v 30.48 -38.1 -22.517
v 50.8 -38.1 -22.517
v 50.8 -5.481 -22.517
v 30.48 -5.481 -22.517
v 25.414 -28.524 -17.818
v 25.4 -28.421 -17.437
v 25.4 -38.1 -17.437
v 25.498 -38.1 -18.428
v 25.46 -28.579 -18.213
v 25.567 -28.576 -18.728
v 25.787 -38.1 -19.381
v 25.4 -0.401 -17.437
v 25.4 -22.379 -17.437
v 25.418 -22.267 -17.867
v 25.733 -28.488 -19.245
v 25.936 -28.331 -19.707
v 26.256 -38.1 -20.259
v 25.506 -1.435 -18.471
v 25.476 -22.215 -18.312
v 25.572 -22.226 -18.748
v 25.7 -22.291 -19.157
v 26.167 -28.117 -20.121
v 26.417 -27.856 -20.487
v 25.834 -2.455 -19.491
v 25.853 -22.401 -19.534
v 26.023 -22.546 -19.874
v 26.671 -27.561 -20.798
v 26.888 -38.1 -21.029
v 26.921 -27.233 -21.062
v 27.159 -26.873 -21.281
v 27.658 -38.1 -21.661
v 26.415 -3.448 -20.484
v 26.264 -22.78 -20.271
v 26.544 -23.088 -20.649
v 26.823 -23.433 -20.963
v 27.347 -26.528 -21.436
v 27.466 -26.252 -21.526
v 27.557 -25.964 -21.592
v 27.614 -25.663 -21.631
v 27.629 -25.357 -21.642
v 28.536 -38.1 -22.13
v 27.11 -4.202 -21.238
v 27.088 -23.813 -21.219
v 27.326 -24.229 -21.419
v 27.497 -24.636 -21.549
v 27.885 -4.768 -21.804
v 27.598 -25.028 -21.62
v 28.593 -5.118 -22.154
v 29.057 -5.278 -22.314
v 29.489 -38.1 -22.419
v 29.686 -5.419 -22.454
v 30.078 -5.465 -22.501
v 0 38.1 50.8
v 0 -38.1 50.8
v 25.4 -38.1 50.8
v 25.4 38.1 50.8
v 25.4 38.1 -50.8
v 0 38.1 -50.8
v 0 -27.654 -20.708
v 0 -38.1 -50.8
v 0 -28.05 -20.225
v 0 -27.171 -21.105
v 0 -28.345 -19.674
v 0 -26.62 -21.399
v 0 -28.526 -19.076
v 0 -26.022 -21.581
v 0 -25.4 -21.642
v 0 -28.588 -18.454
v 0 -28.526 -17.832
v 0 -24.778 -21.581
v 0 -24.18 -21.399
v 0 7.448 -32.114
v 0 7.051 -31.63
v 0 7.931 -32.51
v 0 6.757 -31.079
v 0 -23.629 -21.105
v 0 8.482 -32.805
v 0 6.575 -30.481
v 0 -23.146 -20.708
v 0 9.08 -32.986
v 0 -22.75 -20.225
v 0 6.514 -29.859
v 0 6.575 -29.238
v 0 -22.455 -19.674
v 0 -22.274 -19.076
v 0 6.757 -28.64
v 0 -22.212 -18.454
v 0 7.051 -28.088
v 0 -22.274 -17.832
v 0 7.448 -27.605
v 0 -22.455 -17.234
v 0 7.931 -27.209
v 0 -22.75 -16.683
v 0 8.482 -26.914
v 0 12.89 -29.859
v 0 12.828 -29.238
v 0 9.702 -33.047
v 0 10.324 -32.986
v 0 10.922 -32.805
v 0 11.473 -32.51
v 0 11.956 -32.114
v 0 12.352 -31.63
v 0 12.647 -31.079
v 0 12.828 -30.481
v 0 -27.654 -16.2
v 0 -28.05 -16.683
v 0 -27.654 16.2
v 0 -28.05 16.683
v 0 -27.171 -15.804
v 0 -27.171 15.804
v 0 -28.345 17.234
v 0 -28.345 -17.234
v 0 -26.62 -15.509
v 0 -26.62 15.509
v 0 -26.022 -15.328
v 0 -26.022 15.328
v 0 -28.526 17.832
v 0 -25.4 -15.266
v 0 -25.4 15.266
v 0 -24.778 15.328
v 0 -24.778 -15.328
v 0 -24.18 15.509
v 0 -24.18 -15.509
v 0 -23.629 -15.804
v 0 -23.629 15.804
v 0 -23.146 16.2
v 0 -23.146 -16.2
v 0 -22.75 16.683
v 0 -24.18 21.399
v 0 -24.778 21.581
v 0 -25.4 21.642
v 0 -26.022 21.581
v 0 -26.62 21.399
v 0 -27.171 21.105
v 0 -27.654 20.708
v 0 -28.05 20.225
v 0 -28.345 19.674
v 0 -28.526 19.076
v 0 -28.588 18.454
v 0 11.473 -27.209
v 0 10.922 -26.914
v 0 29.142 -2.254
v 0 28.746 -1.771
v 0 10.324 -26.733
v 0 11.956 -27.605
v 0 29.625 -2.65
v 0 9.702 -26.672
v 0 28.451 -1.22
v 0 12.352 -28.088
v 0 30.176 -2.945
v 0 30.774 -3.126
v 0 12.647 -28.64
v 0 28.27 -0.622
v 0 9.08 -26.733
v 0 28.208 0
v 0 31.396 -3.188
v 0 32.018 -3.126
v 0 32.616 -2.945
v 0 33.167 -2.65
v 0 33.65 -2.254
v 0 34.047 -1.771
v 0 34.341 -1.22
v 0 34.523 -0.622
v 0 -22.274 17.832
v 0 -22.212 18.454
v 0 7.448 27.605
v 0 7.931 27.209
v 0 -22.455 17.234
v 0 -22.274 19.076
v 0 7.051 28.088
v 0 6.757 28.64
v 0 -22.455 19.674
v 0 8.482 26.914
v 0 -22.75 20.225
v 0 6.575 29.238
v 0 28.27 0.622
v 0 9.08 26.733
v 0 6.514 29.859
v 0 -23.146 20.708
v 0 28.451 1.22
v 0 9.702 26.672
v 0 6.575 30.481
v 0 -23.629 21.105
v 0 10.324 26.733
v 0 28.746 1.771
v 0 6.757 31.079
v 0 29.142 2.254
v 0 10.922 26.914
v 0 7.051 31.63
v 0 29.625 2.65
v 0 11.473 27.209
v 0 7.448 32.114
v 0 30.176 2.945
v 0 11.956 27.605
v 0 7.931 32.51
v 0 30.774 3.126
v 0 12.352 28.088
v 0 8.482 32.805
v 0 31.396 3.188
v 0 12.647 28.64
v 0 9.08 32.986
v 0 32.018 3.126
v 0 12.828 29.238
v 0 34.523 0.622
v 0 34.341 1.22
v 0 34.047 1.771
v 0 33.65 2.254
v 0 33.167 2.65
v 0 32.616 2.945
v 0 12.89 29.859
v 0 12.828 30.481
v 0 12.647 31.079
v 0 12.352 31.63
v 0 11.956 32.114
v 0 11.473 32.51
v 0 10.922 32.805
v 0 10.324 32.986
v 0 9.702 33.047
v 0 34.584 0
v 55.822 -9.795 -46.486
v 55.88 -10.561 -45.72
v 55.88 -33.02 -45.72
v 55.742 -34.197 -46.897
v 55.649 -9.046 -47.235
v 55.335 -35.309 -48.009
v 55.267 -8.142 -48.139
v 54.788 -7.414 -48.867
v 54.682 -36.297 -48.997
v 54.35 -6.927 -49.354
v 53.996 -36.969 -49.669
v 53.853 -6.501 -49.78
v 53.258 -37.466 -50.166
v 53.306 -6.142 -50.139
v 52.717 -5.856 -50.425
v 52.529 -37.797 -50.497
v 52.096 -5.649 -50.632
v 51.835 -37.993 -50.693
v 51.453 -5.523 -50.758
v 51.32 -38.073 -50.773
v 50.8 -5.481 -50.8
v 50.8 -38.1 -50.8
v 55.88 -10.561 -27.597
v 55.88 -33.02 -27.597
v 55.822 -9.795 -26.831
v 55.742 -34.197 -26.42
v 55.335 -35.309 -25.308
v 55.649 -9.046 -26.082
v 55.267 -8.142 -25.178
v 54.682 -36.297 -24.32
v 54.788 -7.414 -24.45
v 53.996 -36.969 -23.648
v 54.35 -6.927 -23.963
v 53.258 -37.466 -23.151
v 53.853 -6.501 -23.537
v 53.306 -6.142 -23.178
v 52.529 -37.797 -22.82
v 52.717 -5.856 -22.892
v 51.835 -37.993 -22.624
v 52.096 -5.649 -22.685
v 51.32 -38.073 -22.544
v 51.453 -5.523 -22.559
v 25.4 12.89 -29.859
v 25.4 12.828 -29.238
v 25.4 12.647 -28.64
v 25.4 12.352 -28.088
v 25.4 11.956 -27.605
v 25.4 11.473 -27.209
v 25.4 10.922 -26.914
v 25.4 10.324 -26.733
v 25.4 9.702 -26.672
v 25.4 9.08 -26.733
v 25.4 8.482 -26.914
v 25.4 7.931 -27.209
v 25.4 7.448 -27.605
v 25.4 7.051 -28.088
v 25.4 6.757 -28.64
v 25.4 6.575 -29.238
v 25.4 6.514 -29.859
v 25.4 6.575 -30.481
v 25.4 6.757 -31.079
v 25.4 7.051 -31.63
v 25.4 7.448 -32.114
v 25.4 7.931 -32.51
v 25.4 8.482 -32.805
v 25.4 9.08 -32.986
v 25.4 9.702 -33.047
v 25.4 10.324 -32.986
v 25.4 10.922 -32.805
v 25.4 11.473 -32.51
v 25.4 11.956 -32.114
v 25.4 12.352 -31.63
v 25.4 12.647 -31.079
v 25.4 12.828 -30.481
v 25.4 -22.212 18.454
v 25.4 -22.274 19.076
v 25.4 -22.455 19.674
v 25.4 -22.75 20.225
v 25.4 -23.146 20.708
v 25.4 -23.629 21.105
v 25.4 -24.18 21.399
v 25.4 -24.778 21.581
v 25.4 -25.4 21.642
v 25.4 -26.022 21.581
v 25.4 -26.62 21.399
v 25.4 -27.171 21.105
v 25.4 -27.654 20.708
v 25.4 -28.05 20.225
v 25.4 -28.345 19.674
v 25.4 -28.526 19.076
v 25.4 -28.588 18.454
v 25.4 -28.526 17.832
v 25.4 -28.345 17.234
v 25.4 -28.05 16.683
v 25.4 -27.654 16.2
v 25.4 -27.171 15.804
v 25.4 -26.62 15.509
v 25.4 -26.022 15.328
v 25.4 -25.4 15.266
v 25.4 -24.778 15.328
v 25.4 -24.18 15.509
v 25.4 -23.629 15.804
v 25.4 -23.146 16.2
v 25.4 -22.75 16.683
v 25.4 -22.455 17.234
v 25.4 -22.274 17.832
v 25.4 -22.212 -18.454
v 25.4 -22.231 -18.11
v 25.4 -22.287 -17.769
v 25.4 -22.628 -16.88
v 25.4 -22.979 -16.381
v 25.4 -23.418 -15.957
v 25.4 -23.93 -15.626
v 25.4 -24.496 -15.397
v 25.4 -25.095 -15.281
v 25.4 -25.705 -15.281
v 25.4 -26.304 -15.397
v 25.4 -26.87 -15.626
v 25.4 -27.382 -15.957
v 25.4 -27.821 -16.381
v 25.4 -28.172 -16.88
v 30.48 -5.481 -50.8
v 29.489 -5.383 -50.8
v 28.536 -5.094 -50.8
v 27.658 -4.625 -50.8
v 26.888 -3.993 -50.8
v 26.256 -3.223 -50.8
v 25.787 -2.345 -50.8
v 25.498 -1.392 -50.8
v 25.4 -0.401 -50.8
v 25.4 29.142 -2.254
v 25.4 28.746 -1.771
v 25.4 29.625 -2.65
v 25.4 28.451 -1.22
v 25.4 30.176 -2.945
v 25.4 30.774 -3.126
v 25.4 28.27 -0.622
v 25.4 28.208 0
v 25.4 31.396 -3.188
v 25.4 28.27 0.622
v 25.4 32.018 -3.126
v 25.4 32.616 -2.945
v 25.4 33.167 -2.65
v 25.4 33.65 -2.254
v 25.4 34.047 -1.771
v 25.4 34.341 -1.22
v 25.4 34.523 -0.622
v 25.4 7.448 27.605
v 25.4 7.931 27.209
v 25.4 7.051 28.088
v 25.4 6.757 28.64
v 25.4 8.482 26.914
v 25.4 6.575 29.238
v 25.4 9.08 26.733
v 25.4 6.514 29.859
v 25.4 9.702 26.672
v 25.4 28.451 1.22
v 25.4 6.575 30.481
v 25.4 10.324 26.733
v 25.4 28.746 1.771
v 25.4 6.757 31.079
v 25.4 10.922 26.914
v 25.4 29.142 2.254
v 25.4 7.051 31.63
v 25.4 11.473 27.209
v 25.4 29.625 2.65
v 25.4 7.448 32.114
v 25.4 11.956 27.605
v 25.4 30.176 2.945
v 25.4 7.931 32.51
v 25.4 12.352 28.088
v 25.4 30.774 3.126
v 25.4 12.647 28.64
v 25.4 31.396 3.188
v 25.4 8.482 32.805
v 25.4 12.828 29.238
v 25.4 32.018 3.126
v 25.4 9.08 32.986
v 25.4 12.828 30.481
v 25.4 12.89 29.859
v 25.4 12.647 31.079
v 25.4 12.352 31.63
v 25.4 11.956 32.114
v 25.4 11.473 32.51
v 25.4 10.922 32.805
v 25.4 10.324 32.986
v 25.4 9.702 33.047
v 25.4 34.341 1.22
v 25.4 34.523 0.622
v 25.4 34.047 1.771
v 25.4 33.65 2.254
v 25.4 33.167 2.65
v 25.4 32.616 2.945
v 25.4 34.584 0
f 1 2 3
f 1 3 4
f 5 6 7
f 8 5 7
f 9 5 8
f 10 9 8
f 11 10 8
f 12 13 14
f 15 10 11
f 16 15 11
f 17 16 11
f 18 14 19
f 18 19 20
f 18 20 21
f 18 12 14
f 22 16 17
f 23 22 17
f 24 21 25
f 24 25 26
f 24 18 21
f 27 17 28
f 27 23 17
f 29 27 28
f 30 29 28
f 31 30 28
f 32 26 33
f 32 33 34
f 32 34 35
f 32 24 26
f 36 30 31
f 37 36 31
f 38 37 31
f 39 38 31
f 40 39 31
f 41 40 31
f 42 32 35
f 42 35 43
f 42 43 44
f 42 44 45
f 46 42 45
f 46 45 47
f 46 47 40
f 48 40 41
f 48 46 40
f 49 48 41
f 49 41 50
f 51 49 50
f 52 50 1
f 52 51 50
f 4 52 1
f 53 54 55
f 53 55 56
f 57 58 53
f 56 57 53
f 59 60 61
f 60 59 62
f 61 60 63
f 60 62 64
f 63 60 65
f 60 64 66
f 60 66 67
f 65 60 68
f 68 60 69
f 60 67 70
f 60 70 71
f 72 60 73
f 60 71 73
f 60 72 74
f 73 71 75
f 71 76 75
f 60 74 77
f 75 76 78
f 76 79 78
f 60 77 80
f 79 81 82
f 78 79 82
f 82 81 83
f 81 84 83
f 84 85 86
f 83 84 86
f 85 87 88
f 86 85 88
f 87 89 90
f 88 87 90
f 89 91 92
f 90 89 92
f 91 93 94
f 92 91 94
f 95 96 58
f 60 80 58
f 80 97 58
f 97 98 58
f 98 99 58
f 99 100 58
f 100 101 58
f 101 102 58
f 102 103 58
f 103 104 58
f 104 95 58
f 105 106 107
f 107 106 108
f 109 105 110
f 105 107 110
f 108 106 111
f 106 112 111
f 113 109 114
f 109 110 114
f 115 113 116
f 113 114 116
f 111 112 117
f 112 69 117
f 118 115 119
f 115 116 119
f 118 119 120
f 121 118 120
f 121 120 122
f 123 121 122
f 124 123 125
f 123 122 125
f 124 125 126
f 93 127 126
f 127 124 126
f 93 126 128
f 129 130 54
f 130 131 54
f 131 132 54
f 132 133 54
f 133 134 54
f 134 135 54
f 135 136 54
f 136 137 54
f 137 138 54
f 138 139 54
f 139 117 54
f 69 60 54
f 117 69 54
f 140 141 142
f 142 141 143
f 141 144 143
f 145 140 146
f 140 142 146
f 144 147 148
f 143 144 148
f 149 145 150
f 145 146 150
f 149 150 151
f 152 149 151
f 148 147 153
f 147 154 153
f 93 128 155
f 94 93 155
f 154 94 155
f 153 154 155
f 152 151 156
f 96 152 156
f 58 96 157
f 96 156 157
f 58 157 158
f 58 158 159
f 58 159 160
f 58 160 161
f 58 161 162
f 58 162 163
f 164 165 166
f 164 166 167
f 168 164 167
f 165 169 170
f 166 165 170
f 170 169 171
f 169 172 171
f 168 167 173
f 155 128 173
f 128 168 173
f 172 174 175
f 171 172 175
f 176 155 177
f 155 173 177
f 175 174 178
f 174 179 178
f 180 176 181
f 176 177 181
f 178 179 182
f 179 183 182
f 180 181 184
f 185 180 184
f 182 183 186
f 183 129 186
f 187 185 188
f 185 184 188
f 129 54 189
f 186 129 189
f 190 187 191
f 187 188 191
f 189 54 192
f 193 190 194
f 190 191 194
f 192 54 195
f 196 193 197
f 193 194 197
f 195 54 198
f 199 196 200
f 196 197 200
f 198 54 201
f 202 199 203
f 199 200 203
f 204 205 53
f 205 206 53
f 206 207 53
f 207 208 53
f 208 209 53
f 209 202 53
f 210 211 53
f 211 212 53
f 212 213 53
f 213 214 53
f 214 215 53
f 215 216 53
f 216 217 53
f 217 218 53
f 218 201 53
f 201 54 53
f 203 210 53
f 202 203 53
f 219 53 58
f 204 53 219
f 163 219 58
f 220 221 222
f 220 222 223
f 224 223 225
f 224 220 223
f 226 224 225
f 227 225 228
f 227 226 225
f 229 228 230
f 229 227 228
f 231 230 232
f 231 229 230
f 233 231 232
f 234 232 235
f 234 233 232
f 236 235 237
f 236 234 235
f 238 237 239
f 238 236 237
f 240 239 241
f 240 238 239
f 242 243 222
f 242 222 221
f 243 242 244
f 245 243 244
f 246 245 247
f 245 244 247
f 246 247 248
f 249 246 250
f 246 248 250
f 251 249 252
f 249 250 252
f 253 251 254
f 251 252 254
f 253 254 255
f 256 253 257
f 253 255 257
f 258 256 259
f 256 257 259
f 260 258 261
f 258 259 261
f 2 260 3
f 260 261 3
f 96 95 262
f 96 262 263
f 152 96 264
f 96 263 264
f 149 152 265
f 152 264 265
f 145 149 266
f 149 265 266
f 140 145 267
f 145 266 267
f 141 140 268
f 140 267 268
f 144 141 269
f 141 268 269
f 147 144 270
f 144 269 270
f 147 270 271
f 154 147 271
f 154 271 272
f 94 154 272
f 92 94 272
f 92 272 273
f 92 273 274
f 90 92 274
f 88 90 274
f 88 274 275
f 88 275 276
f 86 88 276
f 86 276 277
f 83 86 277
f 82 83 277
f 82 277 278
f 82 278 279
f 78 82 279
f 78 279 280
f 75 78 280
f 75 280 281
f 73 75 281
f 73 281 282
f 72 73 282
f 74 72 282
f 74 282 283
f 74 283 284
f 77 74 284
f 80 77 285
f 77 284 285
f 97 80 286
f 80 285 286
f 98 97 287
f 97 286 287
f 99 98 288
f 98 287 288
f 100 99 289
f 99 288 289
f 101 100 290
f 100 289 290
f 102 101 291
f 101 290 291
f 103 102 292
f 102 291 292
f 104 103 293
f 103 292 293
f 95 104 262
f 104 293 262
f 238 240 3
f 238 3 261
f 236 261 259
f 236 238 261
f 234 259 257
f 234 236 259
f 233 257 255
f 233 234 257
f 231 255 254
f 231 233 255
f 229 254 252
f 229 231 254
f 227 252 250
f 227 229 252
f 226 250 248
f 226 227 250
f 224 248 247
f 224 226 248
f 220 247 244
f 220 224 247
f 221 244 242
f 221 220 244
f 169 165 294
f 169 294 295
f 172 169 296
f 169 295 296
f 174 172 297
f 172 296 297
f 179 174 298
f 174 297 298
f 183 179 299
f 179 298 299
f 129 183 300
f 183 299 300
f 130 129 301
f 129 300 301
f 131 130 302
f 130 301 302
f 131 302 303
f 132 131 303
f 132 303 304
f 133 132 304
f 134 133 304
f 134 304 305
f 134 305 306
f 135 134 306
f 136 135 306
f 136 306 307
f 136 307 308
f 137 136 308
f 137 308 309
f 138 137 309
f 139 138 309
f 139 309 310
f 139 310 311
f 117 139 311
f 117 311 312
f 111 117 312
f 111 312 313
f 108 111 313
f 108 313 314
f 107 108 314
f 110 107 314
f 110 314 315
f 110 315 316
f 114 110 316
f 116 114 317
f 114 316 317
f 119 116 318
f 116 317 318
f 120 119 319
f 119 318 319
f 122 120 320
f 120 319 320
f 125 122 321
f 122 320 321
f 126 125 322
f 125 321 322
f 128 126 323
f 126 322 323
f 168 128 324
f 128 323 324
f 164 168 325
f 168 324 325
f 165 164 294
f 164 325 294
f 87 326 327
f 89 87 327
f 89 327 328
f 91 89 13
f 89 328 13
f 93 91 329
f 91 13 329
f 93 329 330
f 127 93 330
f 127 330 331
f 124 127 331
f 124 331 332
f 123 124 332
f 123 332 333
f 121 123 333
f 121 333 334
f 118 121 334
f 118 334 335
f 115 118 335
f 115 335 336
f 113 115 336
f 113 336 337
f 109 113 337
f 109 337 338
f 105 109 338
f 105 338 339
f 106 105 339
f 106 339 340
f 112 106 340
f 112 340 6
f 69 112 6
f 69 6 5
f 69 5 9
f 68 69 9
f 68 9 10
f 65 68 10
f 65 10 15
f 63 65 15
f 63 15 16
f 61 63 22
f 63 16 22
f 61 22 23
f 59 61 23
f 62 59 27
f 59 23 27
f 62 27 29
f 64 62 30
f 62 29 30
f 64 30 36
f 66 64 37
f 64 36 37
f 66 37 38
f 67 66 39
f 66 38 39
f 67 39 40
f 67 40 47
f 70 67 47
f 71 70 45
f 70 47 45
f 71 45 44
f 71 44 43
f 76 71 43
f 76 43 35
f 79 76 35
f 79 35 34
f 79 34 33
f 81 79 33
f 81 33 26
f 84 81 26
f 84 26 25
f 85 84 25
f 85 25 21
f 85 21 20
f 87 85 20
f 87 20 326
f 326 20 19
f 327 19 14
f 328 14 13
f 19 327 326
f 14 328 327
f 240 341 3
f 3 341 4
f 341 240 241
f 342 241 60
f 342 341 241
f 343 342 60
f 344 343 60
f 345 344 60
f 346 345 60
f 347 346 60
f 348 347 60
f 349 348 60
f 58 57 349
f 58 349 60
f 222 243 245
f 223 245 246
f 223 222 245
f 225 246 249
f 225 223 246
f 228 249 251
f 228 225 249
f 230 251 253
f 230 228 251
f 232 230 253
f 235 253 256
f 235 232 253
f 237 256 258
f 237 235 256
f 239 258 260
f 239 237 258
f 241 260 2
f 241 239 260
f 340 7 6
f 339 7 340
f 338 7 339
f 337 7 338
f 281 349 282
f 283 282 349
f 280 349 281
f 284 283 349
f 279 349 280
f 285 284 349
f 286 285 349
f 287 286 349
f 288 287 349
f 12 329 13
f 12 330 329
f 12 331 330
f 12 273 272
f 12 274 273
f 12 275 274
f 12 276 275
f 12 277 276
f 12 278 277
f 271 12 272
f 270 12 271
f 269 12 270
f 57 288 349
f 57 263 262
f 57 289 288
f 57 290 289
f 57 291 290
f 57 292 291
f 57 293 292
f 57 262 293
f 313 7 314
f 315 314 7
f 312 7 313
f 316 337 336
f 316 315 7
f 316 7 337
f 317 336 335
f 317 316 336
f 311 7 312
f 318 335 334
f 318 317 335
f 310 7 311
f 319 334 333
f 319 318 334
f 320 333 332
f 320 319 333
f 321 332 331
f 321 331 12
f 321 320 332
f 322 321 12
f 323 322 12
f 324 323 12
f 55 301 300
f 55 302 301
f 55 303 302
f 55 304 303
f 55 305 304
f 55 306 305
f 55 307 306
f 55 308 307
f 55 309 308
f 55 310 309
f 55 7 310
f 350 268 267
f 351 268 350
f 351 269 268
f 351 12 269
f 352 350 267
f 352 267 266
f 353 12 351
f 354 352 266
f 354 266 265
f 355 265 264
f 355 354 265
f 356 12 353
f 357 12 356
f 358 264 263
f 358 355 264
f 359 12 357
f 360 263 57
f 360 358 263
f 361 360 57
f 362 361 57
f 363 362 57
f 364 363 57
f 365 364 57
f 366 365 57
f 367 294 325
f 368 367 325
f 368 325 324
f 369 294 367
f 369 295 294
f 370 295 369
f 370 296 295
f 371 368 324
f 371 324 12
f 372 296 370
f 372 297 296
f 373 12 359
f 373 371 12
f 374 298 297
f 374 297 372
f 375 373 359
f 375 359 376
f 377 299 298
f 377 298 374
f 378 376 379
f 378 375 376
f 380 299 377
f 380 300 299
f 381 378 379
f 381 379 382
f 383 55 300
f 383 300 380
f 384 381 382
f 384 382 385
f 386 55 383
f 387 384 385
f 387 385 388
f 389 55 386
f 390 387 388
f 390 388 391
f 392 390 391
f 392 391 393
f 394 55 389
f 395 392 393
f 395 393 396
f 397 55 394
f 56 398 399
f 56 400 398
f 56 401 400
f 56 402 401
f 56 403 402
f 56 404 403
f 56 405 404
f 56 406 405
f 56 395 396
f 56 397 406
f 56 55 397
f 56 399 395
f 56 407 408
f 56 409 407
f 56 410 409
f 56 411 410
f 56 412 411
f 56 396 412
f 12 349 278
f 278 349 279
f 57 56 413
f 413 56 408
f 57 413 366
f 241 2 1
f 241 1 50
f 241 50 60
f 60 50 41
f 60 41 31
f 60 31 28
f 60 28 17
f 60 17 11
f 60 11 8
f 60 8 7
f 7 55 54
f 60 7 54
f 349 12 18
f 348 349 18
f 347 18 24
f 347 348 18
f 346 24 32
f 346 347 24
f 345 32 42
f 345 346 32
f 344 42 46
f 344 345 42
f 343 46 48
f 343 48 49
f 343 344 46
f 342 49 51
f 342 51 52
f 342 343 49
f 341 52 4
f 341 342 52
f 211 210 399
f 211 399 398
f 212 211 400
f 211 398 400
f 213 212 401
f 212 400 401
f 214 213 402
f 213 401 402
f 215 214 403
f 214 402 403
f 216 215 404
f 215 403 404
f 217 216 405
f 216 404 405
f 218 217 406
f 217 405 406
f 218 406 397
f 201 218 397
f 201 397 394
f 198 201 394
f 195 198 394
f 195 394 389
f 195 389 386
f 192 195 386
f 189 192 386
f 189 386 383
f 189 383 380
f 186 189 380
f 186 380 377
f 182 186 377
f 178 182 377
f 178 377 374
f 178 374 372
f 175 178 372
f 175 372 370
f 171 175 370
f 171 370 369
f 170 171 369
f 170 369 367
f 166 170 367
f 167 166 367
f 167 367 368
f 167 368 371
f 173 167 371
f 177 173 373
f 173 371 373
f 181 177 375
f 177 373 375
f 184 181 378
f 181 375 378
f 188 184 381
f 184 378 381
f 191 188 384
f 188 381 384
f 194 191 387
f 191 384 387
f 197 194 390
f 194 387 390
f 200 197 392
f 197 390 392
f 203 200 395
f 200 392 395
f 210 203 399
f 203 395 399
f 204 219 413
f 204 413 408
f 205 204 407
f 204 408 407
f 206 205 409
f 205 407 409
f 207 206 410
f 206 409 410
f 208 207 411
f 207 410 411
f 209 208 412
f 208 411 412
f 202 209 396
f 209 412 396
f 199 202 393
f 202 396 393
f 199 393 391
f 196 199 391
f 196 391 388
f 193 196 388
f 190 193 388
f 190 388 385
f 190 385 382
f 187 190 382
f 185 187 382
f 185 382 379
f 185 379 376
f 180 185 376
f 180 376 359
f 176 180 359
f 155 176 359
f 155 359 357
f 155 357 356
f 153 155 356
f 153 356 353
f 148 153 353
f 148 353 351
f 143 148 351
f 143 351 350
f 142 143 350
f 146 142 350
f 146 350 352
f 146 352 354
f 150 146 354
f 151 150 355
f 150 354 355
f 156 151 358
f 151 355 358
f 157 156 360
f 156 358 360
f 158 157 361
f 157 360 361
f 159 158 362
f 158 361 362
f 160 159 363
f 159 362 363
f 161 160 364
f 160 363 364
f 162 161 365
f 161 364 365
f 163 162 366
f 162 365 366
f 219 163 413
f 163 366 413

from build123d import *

# Parameters (mm, degrees)
F0_W         = 76.2
F0_H         = 101.6
F1_DEPTH     = 25.4
F3_D         = 6.3754
F4_W         = 32.6189571008
F4_H         = 28.2830937386
F5_DEPTH     = 30.48
F6_T1_DEPTH  = 28.2830937386
F6_T6_DEPTH  = 32.6189571008
F6_S7_R      = 3.1877
F6_T8_DEPTH  = 18
F6_T13_DEPTH = 40.9830937386
F6_T17_DEPTH = 45.3189571008
F6_T20_DEPTH = 53.6830937386
F6_T22_DEPTH = 58.0189571008


# Not quite as in the source:
# - a fillet or chamfer that OpenCascade refuses, or shapes differently, is made with other operations: its cross-section is extruded or revolved along the edge and cut away or added


with BuildPart() as f1:
    # F0 (on Right) → F1 (new body)
    with BuildSketch(Plane.YZ):
        Rectangle(F0_W, F0_H)
    extrude(amount=F1_DEPTH)

    # F3 (through all)
    with Locations(Plane(origin=(0, 0, 0), x_dir=(0, -1, 0), z_dir=(-1, 0, 0))):
        with Locations((-31.3961266285, 0), (-9.7019366858, 29.8594908165), (25.4, 18.4541802113), (25.4, -18.4541802113), (-9.7019366858, -29.8594908165)):
            Hole(F3_D / 2)

    # F4 (on face) → F5 (join)
    with BuildSketch(Plane.YZ.offset(25.4)):
        with Locations((-21.7905214496, -36.6584531307)):
            Rectangle(F4_W, F4_H)
    extrude(amount=F5_DEPTH)

    # F6: fillet of radius 5.08 on 6 edges, made by hand

    # F6_s2 → F6_t1 (join)
    with BuildSketch(Plane.XY.offset(-50.8)):
        with BuildLine():
            ThreePointArc((25.4, -0.4010428992), (26.8878975516, -3.9931453476), (30.48, -5.4810428992))
            Line((30.48, -5.4810428992), (25.4, -5.4810428992))
            Line((25.4, -5.4810428992), (25.4, -0.4010428992))
        make_face()
    extrude(amount=F6_T1_DEPTH)


with BuildPart() as f6_tool4:
    # F6_s5 → F6_t6 (new body)
    with BuildSketch(Plane.XZ.offset(5.4810428992)):
        with BuildLine():
            ThreePointArc((25.4, -17.4369062614), (26.8878975516, -21.0290087099), (30.48, -22.5169062614))
            Line((30.48, -22.5169062614), (25.4, -22.5169062614))
            Line((25.4, -22.5169062614), (25.4, -17.4369062614))
        make_face()
    extrude(amount=F6_T6_DEPTH)

    # F6_s7 → F6_t8 (cut, symmetric)
    with BuildSketch(Plane.YZ.offset(27.9)):
        with Locations((-25.4, -18.4541802113)):
            Circle(F6_S7_R)
    extrude(amount=F6_T8_DEPTH, both=True, mode=Mode.SUBTRACT)


with BuildPart() as f1_1:
    add(f1.part)

    # F6_t3: union F6_tool4
    add(f6_tool4.part)


with BuildPart() as f6_tool11:
    # F6_s12 → F6_t13 (new body)
    with BuildSketch(Plane.XY.offset(-50.8)):
        with BuildLine():
            ThreePointArc((25.4, -0.4010428992), (26.8878975516, -3.9931453476), (30.48, -5.4810428992))
            Line((30.48, -5.4810428992), (25.4, -5.4810428992))
            Line((25.4, -5.4810428992), (25.4, -0.4010428992))
        make_face()
    extrude(amount=F6_T13_DEPTH)

    split(bisect_by=Plane.XY.offset(-22.5169062614), keep=Keep.TOP)


with BuildPart() as f6_tool15:
    # F6_s16 → F6_t17 (new body)
    with BuildSketch(Plane.XZ.offset(-7.2189571008)):
        with BuildLine():
            ThreePointArc((25.4, -17.4369062614), (26.8878975516, -21.0290087099), (30.48, -22.5169062614))
            Line((30.48, -22.5169062614), (25.4, -22.5169062614))
            Line((25.4, -22.5169062614), (25.4, -17.4369062614))
        make_face()
    extrude(amount=F6_T17_DEPTH)

    split(bisect_by=Plane.XZ.offset(5.4810428992), keep=Keep.BOTTOM)


with BuildPart() as f6_tool11_1:
    add(f6_tool11.part)

    # F6_t19: intersect F6_tool15
    add(f6_tool15.part, mode=Mode.INTERSECT)


with BuildPart() as f1_2:
    add(f1_1.part)

    # F6_t9: union F6_tool11
    add(f6_tool11_1.part)

    # F6_s21 → F6_t20 (cut)
    with BuildSketch(Plane.XY.offset(-63.5)):
        with BuildLine():
            ThreePointArc((50.8, -5.4810428992), (54.3921024484, -6.9689404508), (55.88, -10.5610428992))
            Line((55.88, -10.5610428992), (55.88, -5.4810428992))
            Line((55.88, -5.4810428992), (50.8, -5.4810428992))
        make_face()
        with BuildLine():
            ThreePointArc((55.88, -33.02), (54.3921024484, -36.6121024484), (50.8, -38.1))
            Line((50.8, -38.1), (55.88, -38.1))
            Line((55.88, -38.1), (55.88, -33.02))
        make_face()
    extrude(amount=F6_T20_DEPTH, mode=Mode.SUBTRACT)

    # F6_s23 → F6_t22 (cut)
    with BuildSketch(Plane.XZ.offset(-7.2189571008)):
        with BuildLine():
            ThreePointArc((55.88, -45.72), (54.3921024484, -49.3121024484), (50.8, -50.8))
            Line((50.8, -50.8), (55.88, -50.8))
            Line((55.88, -50.8), (55.88, -45.72))
        make_face()
        with BuildLine():
            ThreePointArc((55.88, -27.5969062614), (54.3921024484, -24.004803813), (50.8, -22.5169062614))
            Line((50.8, -22.5169062614), (55.88, -22.5169062614))
            Line((55.88, -22.5169062614), (55.88, -27.5969062614))
        make_face()
    extrude(amount=F6_T22_DEPTH, mode=Mode.SUBTRACT)


solid = f1_2.part
